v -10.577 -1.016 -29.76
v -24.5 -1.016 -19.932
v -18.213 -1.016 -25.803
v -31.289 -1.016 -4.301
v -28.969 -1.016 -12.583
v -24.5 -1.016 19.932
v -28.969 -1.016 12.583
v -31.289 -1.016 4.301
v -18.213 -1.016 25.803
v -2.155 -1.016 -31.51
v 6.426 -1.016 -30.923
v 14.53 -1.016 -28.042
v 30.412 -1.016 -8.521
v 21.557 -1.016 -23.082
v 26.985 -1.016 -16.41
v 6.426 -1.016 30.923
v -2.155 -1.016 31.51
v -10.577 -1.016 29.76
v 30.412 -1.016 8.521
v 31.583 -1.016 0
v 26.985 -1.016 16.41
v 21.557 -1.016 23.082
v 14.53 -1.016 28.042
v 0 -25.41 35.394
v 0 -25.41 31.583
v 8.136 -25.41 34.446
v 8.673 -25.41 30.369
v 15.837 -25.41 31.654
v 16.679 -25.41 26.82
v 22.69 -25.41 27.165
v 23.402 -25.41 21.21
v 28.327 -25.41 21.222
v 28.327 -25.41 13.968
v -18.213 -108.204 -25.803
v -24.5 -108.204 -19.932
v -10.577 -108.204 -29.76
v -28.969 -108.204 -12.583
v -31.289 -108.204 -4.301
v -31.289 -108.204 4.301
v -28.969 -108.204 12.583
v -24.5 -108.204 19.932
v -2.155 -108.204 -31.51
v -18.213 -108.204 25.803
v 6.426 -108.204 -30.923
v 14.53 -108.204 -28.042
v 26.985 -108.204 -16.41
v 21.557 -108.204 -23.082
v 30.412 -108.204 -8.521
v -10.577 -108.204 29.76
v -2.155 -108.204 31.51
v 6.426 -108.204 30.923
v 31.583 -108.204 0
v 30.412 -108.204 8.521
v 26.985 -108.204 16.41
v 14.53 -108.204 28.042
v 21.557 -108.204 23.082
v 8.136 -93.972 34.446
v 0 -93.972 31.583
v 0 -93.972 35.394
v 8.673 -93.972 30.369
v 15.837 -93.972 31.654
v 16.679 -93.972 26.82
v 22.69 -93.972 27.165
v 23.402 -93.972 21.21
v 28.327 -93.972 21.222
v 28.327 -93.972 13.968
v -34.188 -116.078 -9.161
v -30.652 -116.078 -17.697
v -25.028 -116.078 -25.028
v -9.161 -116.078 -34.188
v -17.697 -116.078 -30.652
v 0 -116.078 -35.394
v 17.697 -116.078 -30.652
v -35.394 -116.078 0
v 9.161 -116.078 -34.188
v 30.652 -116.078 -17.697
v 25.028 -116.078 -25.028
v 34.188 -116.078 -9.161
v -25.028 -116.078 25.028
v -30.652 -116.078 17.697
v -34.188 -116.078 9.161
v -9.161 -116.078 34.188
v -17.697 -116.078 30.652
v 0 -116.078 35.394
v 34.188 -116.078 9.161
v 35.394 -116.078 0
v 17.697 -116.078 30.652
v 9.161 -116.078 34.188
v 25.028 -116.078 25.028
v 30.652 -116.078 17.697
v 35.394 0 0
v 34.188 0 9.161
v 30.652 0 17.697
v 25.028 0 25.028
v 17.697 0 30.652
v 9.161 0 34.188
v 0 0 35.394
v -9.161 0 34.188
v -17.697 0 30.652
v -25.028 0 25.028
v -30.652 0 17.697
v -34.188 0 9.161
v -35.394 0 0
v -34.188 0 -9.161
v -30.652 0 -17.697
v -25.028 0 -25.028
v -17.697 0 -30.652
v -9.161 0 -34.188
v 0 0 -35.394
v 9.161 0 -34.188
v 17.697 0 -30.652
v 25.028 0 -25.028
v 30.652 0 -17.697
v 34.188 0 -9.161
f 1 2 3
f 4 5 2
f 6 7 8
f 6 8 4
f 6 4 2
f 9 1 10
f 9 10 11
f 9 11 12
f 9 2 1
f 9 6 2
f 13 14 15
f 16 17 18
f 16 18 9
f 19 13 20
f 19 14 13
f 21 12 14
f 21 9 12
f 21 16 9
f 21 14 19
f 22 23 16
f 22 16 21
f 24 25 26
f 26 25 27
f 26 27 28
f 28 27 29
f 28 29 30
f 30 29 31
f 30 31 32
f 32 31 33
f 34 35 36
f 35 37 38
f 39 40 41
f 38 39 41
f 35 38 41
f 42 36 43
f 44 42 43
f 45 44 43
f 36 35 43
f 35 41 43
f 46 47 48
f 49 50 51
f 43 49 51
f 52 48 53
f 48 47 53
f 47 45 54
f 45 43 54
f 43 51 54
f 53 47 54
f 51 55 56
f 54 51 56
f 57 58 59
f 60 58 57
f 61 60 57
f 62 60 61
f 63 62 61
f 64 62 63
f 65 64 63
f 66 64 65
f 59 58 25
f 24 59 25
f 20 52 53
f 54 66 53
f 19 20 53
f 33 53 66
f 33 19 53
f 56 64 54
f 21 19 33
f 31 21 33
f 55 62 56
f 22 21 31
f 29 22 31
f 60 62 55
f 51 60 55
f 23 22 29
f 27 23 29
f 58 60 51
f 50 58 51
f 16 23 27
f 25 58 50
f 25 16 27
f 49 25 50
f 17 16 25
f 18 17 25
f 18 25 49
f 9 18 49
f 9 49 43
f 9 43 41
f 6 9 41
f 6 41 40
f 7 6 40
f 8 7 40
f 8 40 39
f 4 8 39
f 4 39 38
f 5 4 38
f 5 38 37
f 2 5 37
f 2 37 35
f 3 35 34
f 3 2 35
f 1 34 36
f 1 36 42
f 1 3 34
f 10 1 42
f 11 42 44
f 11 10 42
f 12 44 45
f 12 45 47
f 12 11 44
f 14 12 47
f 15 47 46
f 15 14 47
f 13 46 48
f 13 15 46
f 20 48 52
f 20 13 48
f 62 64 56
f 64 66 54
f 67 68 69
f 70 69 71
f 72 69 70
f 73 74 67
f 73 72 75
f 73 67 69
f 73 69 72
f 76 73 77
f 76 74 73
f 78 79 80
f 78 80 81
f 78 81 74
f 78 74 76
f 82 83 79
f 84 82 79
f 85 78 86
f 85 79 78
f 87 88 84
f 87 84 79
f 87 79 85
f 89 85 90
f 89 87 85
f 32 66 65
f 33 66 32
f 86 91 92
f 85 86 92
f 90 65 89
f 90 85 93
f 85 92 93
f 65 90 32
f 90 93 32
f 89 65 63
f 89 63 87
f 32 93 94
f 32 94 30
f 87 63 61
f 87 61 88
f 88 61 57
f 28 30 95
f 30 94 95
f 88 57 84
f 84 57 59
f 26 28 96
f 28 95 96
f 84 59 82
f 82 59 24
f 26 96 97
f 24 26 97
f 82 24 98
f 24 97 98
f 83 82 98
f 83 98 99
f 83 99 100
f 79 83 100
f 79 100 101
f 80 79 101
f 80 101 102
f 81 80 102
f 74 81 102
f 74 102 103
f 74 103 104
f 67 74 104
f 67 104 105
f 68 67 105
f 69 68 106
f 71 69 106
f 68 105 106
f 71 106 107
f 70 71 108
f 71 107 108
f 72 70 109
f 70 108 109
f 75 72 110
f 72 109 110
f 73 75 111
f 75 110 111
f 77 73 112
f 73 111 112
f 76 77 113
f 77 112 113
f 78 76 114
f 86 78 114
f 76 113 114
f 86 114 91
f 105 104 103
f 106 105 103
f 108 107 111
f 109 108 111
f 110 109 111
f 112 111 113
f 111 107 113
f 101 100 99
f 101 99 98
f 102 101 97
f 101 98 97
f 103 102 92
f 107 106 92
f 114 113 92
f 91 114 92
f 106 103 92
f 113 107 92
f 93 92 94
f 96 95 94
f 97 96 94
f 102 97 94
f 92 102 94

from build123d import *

# Parameters (mm, degrees)
F0_R     = 35.394351
F1_DEPTH = 116.078
F2_R     = 31.583321
F3_DEPTH = 108.204
F4_DEPTH = 1.016
F5_W     = 28.326623
F5_H     = 68.561267
F6_DEPTH = 66.7


with BuildPart() as f1:
    # F0 (on Front) → F1 (new body)
    with BuildSketch(Plane.XZ):
        Circle(F0_R)
    extrude(amount=F1_DEPTH)

    # F2 (on Front) → F3 (cut)
    with BuildSketch(Plane.XZ):
        Circle(F2_R)
    extrude(amount=F3_DEPTH, mode=Mode.SUBTRACT)

    # F2 (on Front) → F4 (join)
    with BuildSketch(Plane.XZ):
        Circle(F2_R)
    extrude(amount=F4_DEPTH)

    # F5 (on Top) → F6 (cut)
    with BuildSketch(Plane.XY):
        with Locations((14.163311, -59.691088)):
            Rectangle(F5_W, F5_H)
    extrude(amount=F6_DEPTH, mode=Mode.SUBTRACT)


solid = f1.part
